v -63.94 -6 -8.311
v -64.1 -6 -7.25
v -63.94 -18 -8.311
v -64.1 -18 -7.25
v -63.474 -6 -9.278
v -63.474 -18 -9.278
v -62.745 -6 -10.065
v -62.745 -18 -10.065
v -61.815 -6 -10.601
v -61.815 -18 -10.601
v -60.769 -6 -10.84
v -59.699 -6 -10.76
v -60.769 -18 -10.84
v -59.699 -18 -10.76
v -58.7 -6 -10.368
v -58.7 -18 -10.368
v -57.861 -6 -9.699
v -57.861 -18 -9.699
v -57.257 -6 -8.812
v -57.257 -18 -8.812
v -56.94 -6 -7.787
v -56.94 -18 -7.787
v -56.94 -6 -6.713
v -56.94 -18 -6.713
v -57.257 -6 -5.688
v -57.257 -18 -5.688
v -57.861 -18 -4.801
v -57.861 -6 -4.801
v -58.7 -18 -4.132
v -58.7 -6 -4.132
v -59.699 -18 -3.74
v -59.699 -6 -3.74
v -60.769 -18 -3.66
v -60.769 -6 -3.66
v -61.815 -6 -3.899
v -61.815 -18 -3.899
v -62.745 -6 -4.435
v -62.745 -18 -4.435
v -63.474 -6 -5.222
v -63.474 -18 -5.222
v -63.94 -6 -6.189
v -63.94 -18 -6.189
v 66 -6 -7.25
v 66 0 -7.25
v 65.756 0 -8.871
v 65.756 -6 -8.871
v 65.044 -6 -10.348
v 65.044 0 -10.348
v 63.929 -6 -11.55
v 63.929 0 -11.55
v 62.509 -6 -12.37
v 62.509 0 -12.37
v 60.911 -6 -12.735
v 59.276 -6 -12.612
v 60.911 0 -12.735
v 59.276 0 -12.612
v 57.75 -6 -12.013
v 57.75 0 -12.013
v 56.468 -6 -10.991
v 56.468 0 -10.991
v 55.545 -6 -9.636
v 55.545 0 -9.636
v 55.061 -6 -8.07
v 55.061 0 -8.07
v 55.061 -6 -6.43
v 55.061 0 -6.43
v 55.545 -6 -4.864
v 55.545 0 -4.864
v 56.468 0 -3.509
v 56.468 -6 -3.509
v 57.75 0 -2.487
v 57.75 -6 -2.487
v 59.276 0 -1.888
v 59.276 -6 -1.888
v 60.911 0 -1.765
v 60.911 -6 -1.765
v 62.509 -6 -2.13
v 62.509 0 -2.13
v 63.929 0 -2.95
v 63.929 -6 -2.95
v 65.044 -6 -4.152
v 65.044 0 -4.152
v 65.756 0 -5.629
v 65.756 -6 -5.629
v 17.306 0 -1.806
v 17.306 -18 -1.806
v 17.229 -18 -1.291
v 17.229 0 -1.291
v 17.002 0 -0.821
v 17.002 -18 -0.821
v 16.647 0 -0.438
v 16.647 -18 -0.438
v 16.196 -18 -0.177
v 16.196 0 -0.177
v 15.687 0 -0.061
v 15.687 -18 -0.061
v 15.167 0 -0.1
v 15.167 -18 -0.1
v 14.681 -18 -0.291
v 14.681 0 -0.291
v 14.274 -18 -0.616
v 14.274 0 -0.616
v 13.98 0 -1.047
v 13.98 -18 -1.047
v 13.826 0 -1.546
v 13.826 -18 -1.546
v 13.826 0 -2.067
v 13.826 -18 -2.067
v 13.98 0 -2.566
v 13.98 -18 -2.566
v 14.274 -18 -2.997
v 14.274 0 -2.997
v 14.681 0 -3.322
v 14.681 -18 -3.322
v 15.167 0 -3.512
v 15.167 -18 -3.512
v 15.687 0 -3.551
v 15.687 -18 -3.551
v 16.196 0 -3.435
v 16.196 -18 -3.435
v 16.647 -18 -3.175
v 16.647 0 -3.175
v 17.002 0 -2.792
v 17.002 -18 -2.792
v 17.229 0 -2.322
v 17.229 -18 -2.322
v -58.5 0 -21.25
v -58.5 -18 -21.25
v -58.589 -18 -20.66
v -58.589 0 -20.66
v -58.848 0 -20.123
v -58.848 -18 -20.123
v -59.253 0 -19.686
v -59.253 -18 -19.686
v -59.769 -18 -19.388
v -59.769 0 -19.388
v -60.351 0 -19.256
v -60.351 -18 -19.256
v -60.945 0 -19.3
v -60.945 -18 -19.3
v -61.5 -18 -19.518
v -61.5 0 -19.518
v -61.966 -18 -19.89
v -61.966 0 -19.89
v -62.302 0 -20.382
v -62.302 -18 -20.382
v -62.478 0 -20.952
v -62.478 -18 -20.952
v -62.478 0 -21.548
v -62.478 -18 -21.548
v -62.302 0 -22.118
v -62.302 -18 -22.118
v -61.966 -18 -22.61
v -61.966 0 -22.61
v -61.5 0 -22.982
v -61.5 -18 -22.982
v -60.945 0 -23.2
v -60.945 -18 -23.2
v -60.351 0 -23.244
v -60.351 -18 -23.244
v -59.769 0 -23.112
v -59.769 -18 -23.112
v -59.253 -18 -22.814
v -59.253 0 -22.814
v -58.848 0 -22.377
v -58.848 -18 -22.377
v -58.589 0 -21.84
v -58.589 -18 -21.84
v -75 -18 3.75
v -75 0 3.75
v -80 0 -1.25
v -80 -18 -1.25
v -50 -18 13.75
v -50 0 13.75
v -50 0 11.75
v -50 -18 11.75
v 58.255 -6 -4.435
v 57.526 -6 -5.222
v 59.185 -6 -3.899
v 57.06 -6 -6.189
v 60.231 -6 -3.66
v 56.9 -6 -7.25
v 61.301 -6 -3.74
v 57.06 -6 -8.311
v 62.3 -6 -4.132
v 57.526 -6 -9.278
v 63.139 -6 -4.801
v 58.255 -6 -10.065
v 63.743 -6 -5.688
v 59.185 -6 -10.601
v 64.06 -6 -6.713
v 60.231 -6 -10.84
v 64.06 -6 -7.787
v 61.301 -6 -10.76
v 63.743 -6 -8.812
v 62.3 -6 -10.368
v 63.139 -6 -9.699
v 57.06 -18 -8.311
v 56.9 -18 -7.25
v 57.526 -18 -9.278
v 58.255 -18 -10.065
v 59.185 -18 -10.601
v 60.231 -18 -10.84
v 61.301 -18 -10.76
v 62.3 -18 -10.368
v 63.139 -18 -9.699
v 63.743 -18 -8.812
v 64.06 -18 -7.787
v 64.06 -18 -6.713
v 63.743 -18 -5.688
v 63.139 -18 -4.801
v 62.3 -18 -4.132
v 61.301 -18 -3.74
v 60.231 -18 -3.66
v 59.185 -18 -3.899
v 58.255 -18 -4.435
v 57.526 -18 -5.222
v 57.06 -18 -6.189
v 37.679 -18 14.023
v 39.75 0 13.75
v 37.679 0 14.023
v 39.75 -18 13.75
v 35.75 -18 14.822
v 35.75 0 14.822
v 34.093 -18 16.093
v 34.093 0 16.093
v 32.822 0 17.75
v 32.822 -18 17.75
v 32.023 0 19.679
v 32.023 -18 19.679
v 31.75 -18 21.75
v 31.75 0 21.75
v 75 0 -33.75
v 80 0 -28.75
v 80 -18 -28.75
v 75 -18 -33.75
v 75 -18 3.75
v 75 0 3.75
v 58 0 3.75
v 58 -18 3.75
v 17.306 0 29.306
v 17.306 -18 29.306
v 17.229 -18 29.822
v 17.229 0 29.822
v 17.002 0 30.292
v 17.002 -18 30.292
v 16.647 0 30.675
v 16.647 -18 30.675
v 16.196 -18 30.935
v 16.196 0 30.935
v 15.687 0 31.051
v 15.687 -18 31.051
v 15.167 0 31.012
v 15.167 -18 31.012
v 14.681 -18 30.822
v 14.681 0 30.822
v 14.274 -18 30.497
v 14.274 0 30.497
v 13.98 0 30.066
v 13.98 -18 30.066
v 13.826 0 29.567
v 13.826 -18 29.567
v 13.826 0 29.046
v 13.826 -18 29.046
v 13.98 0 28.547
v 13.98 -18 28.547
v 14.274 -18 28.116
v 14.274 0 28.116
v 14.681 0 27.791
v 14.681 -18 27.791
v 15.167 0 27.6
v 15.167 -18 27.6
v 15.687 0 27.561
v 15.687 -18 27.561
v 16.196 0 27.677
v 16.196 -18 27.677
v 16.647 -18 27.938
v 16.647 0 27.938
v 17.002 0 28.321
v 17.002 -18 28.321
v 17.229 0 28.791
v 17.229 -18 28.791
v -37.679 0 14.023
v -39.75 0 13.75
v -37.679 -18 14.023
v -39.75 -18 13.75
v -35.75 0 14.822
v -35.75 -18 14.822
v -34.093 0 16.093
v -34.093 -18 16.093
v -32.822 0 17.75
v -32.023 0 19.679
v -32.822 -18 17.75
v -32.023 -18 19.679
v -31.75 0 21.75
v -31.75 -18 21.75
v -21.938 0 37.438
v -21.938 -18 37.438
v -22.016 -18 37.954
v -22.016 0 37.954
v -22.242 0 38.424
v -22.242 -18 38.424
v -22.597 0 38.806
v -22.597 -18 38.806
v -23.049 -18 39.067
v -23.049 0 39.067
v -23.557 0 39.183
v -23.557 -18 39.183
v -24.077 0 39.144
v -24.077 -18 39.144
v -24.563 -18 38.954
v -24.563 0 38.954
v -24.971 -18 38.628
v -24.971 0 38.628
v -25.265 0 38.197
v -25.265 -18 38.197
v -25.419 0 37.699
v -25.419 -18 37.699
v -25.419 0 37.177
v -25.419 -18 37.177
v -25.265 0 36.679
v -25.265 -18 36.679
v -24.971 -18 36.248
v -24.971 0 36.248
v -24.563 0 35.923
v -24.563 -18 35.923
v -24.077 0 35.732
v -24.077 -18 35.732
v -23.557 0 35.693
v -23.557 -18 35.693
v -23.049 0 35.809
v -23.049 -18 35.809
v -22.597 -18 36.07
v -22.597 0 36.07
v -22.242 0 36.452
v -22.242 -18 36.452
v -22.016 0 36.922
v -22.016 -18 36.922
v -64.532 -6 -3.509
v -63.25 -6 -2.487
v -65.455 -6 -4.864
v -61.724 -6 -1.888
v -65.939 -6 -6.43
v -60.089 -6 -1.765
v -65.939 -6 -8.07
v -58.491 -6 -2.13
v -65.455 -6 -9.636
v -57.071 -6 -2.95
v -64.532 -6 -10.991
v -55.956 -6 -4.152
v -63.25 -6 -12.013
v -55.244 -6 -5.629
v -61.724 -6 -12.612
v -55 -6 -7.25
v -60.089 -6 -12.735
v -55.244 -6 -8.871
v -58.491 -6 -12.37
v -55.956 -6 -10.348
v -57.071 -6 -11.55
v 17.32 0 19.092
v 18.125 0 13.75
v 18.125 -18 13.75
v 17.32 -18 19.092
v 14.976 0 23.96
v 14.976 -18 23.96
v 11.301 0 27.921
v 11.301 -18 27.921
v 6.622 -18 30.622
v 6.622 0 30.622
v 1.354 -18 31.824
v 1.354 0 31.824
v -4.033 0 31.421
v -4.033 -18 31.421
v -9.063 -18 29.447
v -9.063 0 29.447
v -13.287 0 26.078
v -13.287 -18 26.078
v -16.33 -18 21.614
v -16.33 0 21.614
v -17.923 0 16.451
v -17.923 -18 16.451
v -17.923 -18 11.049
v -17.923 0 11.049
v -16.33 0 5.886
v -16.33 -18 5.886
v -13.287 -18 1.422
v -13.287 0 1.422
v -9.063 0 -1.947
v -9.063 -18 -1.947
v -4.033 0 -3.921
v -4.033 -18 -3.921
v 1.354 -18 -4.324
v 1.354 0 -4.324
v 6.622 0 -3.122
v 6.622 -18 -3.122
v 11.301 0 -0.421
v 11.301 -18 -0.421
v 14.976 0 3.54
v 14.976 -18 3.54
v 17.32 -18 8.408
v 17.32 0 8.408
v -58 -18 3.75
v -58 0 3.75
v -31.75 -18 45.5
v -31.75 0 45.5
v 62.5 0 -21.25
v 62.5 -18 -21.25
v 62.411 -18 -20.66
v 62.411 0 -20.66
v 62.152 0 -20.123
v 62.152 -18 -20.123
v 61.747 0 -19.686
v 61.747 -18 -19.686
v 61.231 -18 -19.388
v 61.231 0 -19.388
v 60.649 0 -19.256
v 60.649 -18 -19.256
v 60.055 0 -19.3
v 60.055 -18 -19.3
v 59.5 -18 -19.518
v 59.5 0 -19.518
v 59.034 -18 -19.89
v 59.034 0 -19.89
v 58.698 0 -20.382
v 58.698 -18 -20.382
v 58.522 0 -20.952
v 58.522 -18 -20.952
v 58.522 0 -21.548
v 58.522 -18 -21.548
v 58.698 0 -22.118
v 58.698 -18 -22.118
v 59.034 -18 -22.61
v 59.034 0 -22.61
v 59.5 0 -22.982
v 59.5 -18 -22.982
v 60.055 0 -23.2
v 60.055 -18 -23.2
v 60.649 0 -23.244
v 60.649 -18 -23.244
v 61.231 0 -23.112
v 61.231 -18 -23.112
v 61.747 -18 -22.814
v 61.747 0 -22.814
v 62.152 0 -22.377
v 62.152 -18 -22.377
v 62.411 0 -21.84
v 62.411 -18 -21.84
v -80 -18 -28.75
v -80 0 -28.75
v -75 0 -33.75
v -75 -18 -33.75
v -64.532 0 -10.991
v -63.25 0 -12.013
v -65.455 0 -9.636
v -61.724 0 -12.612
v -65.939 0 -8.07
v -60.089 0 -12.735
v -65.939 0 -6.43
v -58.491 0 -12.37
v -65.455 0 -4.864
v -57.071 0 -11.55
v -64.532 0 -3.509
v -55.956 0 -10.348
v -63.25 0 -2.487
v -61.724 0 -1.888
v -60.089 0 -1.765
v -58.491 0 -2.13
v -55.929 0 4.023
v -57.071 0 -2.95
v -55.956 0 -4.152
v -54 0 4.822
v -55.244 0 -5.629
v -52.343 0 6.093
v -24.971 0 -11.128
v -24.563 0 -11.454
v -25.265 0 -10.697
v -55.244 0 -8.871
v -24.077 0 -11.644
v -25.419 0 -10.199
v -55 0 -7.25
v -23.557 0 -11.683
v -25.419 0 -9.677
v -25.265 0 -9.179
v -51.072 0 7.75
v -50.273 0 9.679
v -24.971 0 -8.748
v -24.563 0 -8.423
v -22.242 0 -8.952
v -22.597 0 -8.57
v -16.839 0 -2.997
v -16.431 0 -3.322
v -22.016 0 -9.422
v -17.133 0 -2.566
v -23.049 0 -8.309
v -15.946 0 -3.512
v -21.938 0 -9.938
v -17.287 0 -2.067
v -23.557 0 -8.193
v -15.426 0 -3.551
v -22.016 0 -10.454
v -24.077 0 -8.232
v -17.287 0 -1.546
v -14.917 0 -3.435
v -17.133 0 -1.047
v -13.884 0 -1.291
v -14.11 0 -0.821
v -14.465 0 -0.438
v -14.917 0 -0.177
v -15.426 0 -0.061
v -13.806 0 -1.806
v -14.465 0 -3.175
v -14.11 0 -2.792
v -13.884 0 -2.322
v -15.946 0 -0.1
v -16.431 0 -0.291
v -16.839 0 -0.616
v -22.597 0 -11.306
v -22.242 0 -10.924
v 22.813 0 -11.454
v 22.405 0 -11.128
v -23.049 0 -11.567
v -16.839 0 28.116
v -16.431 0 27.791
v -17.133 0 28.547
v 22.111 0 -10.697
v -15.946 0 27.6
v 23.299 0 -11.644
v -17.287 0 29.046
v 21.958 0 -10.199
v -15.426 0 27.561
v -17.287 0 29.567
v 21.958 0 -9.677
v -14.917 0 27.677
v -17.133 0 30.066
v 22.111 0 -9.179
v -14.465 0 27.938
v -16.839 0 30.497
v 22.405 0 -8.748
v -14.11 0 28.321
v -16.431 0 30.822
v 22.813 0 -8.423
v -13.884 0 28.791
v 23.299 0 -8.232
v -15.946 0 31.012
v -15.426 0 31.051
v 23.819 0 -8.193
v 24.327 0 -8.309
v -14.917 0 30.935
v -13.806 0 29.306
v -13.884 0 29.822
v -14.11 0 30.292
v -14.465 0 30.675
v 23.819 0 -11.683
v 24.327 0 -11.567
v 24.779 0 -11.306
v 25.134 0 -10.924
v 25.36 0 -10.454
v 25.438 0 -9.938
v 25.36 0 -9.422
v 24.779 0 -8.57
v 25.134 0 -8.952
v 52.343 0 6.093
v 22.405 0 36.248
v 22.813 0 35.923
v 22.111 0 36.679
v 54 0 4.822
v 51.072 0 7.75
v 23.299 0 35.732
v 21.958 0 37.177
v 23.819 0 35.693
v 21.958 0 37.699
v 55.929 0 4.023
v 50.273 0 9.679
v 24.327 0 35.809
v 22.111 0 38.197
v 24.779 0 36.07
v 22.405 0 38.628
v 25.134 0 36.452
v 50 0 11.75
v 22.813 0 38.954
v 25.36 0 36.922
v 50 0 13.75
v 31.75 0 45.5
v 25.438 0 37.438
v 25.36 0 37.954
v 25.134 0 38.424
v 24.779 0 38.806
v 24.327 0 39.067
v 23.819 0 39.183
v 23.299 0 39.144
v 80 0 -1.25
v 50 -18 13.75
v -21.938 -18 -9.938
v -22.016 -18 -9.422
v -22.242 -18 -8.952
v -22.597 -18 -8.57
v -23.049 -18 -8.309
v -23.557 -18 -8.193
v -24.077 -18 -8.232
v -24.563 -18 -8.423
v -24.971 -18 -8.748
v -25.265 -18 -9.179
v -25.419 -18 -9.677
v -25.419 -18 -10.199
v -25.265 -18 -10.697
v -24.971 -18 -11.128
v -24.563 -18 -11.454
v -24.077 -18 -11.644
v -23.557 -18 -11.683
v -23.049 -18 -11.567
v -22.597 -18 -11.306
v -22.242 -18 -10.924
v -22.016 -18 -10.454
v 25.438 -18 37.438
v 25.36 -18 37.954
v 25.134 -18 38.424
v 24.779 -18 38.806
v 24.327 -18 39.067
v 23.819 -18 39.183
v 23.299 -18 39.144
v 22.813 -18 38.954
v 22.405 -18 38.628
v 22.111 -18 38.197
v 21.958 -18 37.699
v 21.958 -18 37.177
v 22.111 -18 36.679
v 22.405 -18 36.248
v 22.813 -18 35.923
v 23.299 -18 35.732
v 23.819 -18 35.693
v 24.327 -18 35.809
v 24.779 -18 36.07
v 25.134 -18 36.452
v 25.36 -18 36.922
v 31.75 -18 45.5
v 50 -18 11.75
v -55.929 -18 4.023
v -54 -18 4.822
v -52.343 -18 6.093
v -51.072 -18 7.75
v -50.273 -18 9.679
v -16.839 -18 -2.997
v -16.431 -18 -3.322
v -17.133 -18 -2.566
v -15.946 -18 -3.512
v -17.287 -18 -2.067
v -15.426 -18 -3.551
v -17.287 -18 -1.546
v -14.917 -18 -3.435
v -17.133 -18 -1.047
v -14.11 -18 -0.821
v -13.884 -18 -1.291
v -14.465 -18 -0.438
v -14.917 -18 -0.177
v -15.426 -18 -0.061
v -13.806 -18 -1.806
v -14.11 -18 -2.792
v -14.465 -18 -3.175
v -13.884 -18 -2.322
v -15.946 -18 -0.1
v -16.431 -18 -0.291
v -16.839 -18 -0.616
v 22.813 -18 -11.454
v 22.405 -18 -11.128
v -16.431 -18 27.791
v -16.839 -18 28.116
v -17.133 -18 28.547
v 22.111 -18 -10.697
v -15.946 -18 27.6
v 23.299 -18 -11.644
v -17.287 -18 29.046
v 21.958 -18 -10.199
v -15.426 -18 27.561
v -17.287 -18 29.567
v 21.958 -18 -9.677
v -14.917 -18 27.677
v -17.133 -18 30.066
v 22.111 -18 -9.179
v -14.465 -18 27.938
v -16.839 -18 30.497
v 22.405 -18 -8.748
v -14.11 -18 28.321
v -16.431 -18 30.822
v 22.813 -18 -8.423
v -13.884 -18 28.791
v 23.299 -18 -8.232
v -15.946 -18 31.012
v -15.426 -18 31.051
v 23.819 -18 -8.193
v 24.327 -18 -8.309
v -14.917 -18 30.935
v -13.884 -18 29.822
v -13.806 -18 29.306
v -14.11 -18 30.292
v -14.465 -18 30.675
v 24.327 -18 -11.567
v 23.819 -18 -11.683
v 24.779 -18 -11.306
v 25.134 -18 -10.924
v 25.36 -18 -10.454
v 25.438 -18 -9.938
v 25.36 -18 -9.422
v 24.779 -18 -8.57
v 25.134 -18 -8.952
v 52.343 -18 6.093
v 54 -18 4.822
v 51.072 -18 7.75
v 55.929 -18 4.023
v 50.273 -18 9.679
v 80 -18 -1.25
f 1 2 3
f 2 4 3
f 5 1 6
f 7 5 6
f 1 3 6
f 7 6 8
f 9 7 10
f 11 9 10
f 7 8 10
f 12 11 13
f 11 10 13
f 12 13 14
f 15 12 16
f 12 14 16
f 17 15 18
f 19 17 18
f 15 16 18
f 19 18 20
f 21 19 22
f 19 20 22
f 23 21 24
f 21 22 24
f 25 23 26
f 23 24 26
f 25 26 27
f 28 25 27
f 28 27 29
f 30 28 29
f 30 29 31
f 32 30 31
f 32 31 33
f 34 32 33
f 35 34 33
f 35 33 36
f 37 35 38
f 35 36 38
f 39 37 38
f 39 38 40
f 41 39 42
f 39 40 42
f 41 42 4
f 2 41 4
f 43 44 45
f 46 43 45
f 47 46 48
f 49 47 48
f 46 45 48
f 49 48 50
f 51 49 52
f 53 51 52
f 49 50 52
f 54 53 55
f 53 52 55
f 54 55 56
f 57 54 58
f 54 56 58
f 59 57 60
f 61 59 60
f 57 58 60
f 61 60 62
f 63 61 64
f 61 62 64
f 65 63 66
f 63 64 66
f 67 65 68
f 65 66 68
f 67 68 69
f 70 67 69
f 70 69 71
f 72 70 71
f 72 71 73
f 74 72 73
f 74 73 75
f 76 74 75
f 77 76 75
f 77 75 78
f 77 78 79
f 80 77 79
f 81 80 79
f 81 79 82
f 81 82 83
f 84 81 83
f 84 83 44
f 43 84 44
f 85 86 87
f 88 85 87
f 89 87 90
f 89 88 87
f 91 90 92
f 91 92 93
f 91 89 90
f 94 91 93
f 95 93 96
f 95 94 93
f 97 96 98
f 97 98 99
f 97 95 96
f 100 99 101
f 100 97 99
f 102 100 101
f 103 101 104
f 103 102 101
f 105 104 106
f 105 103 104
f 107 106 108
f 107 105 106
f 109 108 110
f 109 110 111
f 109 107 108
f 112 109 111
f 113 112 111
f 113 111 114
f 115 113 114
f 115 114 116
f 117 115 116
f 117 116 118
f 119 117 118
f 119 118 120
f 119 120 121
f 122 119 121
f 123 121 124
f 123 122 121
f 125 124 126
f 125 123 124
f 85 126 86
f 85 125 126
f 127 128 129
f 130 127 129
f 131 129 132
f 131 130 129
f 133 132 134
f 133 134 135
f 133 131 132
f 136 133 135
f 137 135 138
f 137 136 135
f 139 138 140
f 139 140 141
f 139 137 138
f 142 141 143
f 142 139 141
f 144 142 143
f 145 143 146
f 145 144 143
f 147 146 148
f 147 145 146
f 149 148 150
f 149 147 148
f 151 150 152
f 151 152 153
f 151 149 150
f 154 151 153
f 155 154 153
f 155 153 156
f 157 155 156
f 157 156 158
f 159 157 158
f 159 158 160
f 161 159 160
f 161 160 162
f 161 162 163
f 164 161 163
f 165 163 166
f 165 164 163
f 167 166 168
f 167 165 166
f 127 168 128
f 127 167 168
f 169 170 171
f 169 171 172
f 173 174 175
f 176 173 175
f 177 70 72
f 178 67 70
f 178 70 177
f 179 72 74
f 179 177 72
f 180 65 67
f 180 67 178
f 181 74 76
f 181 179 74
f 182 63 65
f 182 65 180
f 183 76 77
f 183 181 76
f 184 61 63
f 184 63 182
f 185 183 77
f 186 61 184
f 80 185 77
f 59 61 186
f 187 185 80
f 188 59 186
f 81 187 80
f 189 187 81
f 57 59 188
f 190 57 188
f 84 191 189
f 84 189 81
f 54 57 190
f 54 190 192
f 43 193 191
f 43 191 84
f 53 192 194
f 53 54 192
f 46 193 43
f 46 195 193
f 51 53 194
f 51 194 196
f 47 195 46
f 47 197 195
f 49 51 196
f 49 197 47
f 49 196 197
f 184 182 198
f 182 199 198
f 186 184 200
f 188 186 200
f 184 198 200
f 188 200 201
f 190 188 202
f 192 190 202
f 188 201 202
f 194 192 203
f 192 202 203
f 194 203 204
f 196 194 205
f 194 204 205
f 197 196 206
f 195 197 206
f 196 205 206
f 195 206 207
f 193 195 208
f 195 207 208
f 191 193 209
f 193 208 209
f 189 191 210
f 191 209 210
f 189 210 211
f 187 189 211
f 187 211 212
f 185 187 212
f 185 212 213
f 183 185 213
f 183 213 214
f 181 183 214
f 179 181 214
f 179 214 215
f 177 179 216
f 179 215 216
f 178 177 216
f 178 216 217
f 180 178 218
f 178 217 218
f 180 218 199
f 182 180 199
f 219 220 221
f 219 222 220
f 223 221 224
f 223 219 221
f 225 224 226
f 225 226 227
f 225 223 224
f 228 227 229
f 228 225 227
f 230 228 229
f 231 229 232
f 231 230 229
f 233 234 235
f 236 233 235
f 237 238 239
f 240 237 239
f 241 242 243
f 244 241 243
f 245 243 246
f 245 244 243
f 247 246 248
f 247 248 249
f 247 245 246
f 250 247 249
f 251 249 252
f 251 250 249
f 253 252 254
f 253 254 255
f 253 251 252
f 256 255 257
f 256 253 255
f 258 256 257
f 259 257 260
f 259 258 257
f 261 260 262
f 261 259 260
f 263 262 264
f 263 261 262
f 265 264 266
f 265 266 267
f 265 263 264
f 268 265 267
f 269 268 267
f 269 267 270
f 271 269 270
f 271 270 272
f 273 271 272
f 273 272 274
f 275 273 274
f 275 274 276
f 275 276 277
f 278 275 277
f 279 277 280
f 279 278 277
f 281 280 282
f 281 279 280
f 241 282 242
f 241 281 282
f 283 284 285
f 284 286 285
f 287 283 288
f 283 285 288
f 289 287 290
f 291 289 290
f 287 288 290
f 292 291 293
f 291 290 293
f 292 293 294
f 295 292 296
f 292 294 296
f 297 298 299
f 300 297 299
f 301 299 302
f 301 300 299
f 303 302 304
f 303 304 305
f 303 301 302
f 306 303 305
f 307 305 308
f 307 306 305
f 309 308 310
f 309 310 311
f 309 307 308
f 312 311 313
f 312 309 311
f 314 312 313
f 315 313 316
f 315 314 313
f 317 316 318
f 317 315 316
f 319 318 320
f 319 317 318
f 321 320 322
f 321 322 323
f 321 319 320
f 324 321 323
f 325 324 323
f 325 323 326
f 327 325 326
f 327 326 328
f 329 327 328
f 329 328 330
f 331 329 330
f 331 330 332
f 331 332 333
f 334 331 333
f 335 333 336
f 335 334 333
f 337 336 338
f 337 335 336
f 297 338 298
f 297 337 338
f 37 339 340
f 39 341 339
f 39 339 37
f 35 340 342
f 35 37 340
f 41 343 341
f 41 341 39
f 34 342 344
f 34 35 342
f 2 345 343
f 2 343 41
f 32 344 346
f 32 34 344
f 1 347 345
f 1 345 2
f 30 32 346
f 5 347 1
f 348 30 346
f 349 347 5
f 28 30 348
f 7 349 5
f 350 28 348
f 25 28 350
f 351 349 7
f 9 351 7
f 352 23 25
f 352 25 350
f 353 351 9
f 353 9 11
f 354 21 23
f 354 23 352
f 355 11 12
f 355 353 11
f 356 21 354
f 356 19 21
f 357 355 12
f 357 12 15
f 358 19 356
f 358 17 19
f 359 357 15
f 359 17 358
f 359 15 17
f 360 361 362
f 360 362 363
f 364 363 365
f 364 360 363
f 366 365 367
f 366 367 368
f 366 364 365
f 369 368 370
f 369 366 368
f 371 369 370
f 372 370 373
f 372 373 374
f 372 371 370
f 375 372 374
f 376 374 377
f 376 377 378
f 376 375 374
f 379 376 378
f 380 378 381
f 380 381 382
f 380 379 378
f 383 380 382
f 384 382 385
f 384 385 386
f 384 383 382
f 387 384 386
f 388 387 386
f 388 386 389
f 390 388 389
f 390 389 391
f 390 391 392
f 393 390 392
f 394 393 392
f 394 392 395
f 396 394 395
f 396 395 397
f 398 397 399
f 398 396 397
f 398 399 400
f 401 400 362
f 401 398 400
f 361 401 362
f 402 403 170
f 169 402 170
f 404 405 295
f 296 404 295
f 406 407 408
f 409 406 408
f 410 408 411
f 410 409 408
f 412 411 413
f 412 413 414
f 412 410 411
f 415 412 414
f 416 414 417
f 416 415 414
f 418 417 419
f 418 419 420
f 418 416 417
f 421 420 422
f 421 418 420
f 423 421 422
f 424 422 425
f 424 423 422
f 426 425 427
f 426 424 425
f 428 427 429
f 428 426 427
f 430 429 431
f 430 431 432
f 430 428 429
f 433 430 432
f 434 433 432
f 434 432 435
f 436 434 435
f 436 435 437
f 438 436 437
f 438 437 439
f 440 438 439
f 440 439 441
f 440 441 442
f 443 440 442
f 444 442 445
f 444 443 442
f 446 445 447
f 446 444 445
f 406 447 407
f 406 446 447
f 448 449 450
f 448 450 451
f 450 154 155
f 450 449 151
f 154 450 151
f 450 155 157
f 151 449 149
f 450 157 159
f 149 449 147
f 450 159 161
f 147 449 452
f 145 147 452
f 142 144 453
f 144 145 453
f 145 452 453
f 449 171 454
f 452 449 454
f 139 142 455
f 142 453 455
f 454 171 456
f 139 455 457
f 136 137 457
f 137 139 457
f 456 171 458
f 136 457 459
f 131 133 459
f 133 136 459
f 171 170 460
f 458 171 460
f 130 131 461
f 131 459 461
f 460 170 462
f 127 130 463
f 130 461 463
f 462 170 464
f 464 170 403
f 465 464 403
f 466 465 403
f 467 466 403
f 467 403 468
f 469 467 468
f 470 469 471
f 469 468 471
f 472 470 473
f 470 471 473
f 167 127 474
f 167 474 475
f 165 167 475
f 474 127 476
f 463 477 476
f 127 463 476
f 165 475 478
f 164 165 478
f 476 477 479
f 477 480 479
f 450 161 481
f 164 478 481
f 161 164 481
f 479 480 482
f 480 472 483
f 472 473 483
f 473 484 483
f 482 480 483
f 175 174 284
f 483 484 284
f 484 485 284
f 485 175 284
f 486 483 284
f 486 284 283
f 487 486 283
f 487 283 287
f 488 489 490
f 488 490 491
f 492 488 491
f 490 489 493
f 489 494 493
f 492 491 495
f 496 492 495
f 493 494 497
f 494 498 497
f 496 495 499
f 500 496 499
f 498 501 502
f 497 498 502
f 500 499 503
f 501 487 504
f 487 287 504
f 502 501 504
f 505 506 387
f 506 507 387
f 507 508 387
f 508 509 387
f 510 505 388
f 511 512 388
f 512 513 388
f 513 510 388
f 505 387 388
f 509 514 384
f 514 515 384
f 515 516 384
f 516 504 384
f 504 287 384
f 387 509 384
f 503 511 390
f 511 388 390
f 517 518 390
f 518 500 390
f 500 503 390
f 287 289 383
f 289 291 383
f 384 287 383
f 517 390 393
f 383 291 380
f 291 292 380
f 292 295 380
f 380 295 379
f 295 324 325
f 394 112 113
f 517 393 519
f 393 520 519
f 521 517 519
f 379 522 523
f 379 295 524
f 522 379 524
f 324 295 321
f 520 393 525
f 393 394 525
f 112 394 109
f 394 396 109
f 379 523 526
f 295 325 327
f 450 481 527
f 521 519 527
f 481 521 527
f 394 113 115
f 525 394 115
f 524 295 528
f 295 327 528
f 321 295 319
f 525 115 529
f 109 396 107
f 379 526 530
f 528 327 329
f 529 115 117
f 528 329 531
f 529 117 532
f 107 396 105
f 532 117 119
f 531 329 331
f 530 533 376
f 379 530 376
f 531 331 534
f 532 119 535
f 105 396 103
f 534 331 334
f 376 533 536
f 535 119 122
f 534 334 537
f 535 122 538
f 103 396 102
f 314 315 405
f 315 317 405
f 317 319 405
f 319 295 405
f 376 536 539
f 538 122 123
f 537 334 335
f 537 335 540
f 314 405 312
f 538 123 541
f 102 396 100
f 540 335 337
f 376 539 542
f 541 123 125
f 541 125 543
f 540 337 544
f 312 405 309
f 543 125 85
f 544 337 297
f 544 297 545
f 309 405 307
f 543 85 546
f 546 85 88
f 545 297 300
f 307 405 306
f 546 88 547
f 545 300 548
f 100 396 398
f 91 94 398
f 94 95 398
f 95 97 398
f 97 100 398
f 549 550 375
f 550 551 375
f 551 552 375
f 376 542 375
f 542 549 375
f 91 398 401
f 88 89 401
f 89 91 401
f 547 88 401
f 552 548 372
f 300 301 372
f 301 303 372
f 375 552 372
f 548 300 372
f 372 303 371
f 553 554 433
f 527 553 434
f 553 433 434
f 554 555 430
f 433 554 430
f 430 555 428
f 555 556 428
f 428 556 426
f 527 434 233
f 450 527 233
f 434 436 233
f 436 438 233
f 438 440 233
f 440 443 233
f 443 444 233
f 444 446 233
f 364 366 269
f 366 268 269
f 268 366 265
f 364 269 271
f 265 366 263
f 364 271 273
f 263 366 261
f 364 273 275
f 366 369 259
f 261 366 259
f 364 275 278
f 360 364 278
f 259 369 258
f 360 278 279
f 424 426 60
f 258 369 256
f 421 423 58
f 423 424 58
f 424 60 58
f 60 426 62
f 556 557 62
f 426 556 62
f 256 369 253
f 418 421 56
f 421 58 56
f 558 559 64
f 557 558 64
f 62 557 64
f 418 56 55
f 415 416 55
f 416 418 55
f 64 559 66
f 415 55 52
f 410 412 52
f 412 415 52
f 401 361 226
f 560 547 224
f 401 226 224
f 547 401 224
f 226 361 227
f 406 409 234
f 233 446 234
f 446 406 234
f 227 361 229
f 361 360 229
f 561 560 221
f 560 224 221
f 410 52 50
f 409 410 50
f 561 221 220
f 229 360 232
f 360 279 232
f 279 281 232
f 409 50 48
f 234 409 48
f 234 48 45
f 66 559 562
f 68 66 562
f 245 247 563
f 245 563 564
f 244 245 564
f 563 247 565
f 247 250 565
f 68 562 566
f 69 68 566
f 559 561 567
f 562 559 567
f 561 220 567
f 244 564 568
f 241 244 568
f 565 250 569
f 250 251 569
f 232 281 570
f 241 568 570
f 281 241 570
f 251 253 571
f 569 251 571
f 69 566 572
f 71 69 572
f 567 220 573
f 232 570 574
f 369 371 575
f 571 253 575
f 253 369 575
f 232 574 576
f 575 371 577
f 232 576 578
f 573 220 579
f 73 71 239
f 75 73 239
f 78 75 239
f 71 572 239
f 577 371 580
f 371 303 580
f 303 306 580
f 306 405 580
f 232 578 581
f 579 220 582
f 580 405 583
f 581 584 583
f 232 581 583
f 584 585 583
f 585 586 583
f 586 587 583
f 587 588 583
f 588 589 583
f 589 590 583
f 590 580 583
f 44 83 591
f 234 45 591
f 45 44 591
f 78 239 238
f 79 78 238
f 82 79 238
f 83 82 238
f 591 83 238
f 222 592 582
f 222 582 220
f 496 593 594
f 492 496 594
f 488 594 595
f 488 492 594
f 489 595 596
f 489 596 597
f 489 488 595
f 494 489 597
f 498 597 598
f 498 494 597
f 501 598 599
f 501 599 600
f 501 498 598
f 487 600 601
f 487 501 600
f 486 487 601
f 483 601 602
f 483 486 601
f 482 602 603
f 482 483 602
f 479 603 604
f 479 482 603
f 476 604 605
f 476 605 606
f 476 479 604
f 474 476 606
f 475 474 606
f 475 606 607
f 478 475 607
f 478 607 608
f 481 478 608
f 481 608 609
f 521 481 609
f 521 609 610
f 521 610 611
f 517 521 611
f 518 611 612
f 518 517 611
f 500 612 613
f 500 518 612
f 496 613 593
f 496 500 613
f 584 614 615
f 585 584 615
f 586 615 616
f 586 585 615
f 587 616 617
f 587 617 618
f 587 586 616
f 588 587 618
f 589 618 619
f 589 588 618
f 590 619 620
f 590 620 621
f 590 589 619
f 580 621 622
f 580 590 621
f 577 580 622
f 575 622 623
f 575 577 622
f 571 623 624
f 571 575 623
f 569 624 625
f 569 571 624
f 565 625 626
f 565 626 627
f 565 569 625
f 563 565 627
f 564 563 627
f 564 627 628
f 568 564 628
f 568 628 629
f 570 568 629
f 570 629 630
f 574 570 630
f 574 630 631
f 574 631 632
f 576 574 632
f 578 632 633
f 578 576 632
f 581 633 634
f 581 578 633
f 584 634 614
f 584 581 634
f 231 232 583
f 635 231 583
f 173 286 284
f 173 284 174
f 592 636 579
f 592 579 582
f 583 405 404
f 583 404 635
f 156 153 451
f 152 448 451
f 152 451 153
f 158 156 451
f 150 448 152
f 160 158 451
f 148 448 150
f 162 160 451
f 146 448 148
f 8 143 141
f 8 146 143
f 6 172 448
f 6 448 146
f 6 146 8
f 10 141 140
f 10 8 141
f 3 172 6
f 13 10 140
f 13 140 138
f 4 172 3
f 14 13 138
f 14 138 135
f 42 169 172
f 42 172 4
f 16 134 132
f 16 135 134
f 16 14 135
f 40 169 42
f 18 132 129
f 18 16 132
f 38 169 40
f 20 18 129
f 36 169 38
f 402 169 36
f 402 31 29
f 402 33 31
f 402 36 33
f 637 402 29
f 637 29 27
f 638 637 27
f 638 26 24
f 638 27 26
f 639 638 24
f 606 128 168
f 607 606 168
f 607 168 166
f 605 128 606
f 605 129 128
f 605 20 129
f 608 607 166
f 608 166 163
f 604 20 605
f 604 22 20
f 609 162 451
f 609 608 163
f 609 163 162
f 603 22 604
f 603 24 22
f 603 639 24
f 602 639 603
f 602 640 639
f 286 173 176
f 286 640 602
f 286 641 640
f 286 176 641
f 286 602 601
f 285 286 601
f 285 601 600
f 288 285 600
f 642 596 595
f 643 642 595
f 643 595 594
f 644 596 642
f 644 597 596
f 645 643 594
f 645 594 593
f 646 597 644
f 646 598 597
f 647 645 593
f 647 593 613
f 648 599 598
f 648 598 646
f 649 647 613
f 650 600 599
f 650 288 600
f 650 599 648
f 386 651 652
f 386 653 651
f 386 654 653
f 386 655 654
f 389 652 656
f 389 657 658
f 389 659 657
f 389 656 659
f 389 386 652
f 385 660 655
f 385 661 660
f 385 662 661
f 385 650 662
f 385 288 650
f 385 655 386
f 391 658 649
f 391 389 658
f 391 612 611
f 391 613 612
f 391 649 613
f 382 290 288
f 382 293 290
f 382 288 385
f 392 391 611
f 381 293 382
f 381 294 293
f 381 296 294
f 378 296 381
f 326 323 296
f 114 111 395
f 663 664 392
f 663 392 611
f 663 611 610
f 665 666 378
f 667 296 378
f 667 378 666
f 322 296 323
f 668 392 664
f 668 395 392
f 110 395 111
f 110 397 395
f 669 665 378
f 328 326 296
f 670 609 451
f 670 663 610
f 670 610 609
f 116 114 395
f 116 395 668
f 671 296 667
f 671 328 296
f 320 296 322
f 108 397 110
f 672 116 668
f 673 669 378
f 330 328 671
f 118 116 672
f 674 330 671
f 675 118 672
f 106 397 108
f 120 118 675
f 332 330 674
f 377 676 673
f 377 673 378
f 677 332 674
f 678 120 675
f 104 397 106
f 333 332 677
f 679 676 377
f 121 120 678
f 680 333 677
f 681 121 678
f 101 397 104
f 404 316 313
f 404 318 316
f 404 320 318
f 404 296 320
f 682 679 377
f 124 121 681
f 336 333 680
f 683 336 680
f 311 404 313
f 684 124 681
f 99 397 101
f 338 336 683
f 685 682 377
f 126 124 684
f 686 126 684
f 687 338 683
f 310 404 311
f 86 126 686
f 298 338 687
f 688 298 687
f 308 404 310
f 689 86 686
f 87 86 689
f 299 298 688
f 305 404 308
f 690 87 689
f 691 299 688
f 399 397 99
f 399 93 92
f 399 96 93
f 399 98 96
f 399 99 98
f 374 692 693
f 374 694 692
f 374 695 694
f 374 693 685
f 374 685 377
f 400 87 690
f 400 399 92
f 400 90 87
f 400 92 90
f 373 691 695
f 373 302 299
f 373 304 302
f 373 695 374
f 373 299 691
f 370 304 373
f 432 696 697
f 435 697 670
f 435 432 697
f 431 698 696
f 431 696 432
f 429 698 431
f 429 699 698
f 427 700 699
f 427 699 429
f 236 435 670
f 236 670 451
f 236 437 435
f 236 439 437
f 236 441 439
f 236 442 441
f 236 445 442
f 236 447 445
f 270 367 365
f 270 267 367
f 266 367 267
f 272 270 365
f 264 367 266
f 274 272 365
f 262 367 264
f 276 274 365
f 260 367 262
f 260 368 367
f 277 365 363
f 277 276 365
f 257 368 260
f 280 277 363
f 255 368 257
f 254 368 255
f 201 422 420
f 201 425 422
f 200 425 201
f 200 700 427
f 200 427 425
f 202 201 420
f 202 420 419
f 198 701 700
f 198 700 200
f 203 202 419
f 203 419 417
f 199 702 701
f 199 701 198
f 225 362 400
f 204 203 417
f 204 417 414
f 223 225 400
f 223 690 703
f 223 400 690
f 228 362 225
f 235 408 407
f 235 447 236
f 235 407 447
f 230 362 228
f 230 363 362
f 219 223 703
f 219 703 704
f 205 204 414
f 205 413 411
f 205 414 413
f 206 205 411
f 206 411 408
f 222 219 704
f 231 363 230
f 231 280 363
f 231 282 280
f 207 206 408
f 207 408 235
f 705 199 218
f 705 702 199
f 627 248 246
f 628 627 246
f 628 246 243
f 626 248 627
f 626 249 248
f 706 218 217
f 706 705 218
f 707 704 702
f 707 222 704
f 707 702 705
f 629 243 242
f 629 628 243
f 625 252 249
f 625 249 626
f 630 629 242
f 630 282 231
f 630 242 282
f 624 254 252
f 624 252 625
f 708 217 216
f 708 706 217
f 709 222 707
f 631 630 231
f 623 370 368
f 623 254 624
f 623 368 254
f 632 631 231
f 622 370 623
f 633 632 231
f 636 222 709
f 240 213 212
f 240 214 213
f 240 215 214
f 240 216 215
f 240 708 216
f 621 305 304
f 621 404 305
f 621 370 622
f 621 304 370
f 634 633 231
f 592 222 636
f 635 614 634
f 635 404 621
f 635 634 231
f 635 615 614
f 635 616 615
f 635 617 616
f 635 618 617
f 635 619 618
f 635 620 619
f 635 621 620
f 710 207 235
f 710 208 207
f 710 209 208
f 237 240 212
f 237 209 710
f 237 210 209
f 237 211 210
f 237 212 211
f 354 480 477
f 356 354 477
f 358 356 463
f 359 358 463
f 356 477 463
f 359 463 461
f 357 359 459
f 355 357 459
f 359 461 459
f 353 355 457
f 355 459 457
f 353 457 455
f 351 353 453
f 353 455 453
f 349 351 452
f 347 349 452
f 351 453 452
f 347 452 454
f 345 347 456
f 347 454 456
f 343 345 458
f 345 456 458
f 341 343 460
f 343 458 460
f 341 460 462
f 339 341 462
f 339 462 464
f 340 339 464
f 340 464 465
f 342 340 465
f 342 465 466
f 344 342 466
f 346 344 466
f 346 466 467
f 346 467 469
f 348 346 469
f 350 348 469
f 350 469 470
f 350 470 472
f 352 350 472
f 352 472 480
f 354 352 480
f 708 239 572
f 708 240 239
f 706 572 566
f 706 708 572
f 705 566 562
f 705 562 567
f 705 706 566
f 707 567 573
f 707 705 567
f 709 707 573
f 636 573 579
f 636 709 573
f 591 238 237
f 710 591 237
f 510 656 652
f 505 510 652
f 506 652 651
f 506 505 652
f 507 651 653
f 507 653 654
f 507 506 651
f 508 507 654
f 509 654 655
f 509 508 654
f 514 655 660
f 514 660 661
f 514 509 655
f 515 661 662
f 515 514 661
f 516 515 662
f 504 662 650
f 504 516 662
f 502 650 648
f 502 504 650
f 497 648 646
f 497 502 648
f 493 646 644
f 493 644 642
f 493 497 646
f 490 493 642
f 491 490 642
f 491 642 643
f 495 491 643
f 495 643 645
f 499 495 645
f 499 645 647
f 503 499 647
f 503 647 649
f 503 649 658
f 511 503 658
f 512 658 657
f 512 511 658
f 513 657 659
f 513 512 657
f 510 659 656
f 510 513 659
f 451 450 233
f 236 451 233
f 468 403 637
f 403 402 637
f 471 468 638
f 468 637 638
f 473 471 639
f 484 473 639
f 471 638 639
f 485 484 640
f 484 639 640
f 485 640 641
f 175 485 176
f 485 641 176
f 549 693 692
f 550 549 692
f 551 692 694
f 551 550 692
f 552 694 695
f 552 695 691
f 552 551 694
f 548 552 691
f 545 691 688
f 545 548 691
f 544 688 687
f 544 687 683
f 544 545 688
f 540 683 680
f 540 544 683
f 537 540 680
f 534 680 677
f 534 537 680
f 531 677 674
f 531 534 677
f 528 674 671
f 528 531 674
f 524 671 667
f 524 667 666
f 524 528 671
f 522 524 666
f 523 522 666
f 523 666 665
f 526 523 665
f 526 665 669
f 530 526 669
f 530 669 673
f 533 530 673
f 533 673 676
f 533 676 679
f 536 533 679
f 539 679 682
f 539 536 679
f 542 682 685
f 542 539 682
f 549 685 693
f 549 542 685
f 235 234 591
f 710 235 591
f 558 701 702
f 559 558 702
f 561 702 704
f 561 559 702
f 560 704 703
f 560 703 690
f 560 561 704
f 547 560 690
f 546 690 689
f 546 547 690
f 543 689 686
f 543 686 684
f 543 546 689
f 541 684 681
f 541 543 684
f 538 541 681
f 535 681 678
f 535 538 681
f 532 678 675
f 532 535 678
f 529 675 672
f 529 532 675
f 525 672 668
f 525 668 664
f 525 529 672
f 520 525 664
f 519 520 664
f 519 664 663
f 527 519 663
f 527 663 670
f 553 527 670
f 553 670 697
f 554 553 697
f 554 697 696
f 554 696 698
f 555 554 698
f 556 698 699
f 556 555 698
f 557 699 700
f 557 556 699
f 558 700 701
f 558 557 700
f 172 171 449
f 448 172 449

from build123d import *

# Parameters (mm, degrees)
F0_R           = 2
F0_W           = 63.5
F0_H           = 11.75
F0_R_2         = 1.75
F0_R_3         = 18.125
F1_DEPTH       = 18
F2_SIZE        = 5
F3_R           = 8
F4_D           = 7.2
F4_DEPTH       = 35
F4_CBORE_D     = 11
F4_CBORE_DEPTH = 6
F4_TIP         = 2.1630982285


with BuildPart() as f1:
    # F0 (on Front) → F1 (new body)
    with BuildSketch(Plane.XZ):
        Polygon((-80, -33.75), (80, -33.75), (80, 3.75), (50, 3.75), (50, 13.75), (31.75, 13.75), (31.75, -18), (-31.75, -18), (-31.75, 13.75), (-50, 13.75), (-50, 3.75), (-80, 3.75), align=None)
        with Locations((-60.5, -21.25)):
            Circle(F0_R, mode=Mode.SUBTRACT)
        with Locations((60.5, -21.25)):
            Circle(F0_R, mode=Mode.SUBTRACT)
        with Locations((0, 39.625)):
            Rectangle(F0_W, F0_H)
        with Locations((-23.6880771697, 37.4380771697)):
            Circle(F0_R_2, mode=Mode.SUBTRACT)
        with Locations((23.6880771697, 37.4380771697)):
            Circle(F0_R_2, mode=Mode.SUBTRACT)
        Polygon((31.75, 13.75), (31.75, 33.75), (-31.75, 33.75), (-31.75, 13.75), (-31.75, -18), (31.75, -18), align=None)
        with Locations((-23.6880771697, -9.9380771697)):
            Circle(F0_R_2, mode=Mode.SUBTRACT)
        with Locations((-15.5563491861, -1.8063491861)):
            Circle(F0_R_2, mode=Mode.SUBTRACT)
        with Locations((23.6880771697, -9.9380771697)):
            Circle(F0_R_2, mode=Mode.SUBTRACT)
        with Locations((15.5563491861, -1.8063491861)):
            Circle(F0_R_2, mode=Mode.SUBTRACT)
        with Locations((-15.5563491861, 29.3063491861)):
            Circle(F0_R_2, mode=Mode.SUBTRACT)
        with Locations((0, 13.75)):
            Circle(F0_R_3, mode=Mode.SUBTRACT)
        with Locations((15.5563491861, 29.3063491861)):
            Circle(F0_R_2, mode=Mode.SUBTRACT)
    extrude(amount=F1_DEPTH)

    # F2
    f2_edges = [f1.edges().sort_by_distance(p)[0] for p in [
        (-80, -9, -33.75),
        (80, -9, -33.75),
        (80, -9, 3.75),
        (-80, -9, 3.75),
    ]]
    chamfer(f2_edges, length=F2_SIZE)

    # F3
    f3_edges = [f1.edges().sort_by_distance(p)[0] for p in [
        (31.75, -9, 13.75),
        (-31.75, -9, 13.75),
        (50, -9, 3.75),
        (-50, -9, 3.75),
    ]]
    fillet(f3_edges, radius=F3_R)

    # F4
    with Locations(Plane(origin=(0, 0, 0), x_dir=(1, 0, 0), z_dir=(0, 1, 0))):
        with Locations((60.5, 7.25), (-60.5, 7.25)):
            CounterBoreHole(F4_D / 2, F4_CBORE_D / 2, F4_CBORE_DEPTH, depth=F4_DEPTH)
            with Locations((0, 0, -(F4_DEPTH + F4_TIP / 2))):  # 118° drill point
                Cone(0, F4_D / 2, F4_TIP, mode=Mode.SUBTRACT)


solid = f1.part
